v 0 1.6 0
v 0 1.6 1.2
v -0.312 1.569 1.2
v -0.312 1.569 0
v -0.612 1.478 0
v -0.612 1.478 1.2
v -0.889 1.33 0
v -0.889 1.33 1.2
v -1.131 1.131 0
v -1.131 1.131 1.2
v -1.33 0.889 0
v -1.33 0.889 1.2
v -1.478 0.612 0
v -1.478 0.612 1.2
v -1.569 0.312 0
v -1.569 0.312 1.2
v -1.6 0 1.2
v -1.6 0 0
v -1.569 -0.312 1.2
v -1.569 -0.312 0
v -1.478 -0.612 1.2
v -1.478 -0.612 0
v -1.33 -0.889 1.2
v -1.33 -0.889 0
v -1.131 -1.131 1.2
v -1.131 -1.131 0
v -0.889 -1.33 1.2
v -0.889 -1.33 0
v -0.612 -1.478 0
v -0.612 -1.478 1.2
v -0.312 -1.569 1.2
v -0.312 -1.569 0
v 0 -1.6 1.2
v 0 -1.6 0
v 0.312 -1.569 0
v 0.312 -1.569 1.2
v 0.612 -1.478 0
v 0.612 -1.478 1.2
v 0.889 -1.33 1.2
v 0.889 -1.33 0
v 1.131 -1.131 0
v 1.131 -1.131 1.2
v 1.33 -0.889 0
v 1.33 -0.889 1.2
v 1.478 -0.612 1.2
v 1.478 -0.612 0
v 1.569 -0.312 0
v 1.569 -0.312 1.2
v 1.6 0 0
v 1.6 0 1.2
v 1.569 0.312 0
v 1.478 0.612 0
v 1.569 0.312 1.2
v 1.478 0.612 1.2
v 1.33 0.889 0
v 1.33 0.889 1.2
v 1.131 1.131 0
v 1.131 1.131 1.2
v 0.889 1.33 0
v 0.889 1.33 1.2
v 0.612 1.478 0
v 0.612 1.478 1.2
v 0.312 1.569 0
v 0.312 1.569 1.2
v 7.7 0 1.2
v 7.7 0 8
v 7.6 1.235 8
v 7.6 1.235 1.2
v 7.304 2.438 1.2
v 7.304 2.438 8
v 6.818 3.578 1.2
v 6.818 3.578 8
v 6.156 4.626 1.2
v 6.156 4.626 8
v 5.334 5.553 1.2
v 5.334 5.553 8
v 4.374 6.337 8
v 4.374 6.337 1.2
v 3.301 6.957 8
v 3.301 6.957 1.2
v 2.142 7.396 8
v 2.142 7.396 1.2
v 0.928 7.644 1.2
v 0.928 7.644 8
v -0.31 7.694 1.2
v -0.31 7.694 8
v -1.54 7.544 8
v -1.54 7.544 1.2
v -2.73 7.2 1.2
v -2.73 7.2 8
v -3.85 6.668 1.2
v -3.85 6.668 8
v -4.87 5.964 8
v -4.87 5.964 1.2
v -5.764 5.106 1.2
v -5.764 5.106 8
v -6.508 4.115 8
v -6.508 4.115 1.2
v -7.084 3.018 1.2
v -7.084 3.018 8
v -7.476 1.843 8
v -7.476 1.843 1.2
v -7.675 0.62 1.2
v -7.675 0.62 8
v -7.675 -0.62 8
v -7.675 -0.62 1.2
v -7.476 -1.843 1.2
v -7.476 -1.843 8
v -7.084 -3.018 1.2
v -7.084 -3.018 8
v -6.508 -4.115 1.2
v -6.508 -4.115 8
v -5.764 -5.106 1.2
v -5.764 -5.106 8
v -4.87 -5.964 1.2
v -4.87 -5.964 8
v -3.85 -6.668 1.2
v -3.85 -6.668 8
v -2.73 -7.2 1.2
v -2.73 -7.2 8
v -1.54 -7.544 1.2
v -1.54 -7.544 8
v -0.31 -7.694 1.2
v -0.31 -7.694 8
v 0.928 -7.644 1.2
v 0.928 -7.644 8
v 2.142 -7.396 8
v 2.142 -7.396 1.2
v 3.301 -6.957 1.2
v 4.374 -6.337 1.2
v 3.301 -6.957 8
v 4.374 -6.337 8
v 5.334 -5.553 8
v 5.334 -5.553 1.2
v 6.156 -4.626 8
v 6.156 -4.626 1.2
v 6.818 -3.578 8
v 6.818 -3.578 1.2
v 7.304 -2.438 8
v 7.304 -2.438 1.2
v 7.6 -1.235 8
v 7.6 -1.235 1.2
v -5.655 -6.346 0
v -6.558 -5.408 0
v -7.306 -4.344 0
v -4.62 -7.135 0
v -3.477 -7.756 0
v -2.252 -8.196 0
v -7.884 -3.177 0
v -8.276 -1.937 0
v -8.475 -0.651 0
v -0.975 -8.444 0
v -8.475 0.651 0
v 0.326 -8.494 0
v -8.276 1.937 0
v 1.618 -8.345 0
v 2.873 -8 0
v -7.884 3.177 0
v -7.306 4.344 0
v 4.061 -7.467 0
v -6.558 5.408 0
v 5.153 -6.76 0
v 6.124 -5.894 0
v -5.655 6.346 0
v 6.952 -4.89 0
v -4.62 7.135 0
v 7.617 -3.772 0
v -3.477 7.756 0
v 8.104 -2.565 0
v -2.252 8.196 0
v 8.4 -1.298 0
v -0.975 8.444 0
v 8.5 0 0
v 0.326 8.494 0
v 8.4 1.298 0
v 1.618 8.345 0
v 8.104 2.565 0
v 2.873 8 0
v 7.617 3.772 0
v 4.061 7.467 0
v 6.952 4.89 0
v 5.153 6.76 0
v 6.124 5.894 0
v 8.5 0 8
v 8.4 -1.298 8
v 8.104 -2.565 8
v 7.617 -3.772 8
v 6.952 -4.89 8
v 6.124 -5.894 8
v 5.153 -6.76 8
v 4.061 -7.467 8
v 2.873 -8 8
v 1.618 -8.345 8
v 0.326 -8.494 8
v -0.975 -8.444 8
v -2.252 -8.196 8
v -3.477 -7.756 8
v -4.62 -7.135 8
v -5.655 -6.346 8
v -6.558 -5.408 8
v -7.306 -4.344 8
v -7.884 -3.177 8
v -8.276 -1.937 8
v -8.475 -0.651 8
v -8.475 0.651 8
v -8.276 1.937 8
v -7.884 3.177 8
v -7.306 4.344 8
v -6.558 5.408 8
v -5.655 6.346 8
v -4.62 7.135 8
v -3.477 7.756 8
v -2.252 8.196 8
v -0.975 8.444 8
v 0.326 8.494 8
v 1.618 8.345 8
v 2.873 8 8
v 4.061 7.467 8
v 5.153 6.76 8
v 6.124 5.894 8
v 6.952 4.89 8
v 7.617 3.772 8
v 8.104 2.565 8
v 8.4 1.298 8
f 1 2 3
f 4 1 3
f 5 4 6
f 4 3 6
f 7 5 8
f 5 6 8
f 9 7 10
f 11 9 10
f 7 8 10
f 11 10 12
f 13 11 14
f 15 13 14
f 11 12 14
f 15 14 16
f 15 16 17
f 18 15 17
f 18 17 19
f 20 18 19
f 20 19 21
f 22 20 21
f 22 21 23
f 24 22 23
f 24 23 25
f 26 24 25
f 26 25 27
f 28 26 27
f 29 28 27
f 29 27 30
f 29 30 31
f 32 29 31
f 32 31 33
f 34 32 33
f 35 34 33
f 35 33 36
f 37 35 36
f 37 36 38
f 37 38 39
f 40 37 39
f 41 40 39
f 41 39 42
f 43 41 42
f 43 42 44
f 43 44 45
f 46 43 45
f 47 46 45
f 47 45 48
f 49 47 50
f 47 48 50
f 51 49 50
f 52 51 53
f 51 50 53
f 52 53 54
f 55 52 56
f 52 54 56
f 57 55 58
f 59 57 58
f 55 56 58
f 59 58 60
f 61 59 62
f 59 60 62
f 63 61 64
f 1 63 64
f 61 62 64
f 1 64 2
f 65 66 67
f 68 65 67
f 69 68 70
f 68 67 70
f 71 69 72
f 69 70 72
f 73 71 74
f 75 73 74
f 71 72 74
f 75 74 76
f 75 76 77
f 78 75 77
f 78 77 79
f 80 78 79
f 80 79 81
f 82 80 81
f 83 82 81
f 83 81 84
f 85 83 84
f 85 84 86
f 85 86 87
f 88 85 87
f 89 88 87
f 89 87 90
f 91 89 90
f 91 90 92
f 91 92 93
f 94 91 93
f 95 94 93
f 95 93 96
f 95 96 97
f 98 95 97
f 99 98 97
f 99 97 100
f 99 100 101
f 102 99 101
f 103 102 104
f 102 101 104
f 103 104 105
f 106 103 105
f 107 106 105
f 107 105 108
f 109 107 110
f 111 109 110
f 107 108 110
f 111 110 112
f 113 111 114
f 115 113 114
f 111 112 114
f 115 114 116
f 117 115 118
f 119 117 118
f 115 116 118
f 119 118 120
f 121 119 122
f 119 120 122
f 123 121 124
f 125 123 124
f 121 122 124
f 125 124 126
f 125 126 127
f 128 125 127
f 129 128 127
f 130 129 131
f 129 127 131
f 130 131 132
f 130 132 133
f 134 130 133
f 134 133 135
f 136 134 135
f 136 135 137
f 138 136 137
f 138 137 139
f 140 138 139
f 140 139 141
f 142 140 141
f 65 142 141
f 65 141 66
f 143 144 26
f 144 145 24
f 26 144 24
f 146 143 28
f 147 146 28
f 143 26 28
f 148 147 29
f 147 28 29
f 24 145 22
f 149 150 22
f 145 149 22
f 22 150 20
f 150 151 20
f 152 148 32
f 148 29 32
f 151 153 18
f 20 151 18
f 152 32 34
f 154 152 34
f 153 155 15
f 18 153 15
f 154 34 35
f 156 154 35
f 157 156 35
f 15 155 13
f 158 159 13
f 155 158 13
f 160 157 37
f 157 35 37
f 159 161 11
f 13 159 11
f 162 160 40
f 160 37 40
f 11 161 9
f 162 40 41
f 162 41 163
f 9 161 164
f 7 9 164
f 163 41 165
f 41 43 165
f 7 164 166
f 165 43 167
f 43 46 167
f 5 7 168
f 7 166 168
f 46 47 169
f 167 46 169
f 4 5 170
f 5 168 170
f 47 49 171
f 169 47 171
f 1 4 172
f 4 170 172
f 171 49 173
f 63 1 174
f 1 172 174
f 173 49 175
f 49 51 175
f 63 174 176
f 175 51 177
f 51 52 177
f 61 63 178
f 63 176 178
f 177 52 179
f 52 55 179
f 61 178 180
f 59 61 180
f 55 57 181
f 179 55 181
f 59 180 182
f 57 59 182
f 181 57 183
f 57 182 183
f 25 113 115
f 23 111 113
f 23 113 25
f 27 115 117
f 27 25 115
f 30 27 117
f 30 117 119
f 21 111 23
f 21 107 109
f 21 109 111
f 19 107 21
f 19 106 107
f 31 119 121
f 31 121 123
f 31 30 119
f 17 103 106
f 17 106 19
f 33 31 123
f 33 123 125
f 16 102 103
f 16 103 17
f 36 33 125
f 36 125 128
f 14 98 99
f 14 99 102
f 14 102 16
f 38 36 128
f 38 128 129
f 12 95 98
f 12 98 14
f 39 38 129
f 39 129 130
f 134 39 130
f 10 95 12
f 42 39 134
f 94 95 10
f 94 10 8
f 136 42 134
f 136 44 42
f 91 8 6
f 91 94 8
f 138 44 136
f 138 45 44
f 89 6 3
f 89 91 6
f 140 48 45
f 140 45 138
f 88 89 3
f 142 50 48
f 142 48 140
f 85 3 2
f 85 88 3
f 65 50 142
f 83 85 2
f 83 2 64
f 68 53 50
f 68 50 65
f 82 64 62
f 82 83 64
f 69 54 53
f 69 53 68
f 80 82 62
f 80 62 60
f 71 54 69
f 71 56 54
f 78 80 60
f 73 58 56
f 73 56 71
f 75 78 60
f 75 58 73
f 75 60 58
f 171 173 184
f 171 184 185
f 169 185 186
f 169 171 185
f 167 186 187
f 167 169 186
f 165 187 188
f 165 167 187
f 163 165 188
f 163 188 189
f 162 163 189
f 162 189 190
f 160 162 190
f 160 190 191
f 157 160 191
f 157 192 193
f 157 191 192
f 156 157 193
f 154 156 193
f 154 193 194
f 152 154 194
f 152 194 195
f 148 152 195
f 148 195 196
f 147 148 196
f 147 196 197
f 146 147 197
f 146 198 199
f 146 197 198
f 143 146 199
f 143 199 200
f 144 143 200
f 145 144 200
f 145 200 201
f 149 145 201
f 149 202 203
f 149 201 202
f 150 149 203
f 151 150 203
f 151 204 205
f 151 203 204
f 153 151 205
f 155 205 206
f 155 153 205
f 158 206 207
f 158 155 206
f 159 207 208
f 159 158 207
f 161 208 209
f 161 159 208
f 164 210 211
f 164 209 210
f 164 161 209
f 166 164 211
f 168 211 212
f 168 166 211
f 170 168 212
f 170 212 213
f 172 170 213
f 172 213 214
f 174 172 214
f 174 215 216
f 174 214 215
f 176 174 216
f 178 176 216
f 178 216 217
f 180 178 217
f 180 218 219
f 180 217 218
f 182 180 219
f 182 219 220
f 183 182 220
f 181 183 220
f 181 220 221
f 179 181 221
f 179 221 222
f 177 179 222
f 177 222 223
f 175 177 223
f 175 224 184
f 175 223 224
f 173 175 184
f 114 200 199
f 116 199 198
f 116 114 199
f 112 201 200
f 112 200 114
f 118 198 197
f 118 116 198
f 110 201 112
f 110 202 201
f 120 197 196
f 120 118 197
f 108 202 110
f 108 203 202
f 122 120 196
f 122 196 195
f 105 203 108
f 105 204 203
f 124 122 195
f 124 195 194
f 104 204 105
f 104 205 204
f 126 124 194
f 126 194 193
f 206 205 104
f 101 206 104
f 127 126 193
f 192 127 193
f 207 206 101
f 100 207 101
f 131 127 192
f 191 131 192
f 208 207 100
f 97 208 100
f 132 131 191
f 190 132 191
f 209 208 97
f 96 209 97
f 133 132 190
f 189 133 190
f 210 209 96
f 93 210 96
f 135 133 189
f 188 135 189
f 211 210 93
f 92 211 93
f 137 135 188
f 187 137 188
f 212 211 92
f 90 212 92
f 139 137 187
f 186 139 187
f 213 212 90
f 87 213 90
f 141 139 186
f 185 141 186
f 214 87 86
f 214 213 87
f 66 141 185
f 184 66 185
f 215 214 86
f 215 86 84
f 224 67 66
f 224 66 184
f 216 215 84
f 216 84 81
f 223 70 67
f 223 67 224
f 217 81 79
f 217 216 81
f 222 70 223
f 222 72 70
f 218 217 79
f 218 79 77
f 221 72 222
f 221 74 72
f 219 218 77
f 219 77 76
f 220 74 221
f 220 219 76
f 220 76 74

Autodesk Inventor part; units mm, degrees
ref_plane "YZ Plane" through (0, 0, 0) normal (1, 0, 0) x (0, 1, 0)
ref_plane "XZ Plane" through (0, 0, 0) normal (0, 1, 0) x (-1, 0, 0)
ref_plane "XY Plane" through (0, 0, 0) normal (0, 0, 1) x (1, 0, 0)
sketch "Sketch1" plane through (0, 0, 0) normal (0, 0, 1) x (1, 0, 0)
  circle A0 centre (0, 0) radius 8.5
  dimension "d0" = 17
extrude "Extrusion1" add sketch "Sketch1" along normal blind 8
sketch "Sketch2" plane through (0, 0, 8) normal (0, 0, 1) x (1, 0, 0)
  circle A0 centre (0, 0) radius 7.7
  circle A1 centre (0, 0) radius 8.5 projected
  dimension "d3" = 0.8
extrude "Extrusion2" cut sketch "Sketch2" against normal blind 6.8 contours A0
sketch "Sketch3" plane through (0, 0, 0) normal (0, 0, -1) x (-1, 0, 0)
  point P0 (0, 0)
hole "Hole1" at (0, 0, 0) direction (0, 0, 1) diameter 3.2 end through all clearance for "Flat Head Machine Screw" size "M3" standard "Ansi Metric M Profile"
properties part number "SpoolSpringBushing"
